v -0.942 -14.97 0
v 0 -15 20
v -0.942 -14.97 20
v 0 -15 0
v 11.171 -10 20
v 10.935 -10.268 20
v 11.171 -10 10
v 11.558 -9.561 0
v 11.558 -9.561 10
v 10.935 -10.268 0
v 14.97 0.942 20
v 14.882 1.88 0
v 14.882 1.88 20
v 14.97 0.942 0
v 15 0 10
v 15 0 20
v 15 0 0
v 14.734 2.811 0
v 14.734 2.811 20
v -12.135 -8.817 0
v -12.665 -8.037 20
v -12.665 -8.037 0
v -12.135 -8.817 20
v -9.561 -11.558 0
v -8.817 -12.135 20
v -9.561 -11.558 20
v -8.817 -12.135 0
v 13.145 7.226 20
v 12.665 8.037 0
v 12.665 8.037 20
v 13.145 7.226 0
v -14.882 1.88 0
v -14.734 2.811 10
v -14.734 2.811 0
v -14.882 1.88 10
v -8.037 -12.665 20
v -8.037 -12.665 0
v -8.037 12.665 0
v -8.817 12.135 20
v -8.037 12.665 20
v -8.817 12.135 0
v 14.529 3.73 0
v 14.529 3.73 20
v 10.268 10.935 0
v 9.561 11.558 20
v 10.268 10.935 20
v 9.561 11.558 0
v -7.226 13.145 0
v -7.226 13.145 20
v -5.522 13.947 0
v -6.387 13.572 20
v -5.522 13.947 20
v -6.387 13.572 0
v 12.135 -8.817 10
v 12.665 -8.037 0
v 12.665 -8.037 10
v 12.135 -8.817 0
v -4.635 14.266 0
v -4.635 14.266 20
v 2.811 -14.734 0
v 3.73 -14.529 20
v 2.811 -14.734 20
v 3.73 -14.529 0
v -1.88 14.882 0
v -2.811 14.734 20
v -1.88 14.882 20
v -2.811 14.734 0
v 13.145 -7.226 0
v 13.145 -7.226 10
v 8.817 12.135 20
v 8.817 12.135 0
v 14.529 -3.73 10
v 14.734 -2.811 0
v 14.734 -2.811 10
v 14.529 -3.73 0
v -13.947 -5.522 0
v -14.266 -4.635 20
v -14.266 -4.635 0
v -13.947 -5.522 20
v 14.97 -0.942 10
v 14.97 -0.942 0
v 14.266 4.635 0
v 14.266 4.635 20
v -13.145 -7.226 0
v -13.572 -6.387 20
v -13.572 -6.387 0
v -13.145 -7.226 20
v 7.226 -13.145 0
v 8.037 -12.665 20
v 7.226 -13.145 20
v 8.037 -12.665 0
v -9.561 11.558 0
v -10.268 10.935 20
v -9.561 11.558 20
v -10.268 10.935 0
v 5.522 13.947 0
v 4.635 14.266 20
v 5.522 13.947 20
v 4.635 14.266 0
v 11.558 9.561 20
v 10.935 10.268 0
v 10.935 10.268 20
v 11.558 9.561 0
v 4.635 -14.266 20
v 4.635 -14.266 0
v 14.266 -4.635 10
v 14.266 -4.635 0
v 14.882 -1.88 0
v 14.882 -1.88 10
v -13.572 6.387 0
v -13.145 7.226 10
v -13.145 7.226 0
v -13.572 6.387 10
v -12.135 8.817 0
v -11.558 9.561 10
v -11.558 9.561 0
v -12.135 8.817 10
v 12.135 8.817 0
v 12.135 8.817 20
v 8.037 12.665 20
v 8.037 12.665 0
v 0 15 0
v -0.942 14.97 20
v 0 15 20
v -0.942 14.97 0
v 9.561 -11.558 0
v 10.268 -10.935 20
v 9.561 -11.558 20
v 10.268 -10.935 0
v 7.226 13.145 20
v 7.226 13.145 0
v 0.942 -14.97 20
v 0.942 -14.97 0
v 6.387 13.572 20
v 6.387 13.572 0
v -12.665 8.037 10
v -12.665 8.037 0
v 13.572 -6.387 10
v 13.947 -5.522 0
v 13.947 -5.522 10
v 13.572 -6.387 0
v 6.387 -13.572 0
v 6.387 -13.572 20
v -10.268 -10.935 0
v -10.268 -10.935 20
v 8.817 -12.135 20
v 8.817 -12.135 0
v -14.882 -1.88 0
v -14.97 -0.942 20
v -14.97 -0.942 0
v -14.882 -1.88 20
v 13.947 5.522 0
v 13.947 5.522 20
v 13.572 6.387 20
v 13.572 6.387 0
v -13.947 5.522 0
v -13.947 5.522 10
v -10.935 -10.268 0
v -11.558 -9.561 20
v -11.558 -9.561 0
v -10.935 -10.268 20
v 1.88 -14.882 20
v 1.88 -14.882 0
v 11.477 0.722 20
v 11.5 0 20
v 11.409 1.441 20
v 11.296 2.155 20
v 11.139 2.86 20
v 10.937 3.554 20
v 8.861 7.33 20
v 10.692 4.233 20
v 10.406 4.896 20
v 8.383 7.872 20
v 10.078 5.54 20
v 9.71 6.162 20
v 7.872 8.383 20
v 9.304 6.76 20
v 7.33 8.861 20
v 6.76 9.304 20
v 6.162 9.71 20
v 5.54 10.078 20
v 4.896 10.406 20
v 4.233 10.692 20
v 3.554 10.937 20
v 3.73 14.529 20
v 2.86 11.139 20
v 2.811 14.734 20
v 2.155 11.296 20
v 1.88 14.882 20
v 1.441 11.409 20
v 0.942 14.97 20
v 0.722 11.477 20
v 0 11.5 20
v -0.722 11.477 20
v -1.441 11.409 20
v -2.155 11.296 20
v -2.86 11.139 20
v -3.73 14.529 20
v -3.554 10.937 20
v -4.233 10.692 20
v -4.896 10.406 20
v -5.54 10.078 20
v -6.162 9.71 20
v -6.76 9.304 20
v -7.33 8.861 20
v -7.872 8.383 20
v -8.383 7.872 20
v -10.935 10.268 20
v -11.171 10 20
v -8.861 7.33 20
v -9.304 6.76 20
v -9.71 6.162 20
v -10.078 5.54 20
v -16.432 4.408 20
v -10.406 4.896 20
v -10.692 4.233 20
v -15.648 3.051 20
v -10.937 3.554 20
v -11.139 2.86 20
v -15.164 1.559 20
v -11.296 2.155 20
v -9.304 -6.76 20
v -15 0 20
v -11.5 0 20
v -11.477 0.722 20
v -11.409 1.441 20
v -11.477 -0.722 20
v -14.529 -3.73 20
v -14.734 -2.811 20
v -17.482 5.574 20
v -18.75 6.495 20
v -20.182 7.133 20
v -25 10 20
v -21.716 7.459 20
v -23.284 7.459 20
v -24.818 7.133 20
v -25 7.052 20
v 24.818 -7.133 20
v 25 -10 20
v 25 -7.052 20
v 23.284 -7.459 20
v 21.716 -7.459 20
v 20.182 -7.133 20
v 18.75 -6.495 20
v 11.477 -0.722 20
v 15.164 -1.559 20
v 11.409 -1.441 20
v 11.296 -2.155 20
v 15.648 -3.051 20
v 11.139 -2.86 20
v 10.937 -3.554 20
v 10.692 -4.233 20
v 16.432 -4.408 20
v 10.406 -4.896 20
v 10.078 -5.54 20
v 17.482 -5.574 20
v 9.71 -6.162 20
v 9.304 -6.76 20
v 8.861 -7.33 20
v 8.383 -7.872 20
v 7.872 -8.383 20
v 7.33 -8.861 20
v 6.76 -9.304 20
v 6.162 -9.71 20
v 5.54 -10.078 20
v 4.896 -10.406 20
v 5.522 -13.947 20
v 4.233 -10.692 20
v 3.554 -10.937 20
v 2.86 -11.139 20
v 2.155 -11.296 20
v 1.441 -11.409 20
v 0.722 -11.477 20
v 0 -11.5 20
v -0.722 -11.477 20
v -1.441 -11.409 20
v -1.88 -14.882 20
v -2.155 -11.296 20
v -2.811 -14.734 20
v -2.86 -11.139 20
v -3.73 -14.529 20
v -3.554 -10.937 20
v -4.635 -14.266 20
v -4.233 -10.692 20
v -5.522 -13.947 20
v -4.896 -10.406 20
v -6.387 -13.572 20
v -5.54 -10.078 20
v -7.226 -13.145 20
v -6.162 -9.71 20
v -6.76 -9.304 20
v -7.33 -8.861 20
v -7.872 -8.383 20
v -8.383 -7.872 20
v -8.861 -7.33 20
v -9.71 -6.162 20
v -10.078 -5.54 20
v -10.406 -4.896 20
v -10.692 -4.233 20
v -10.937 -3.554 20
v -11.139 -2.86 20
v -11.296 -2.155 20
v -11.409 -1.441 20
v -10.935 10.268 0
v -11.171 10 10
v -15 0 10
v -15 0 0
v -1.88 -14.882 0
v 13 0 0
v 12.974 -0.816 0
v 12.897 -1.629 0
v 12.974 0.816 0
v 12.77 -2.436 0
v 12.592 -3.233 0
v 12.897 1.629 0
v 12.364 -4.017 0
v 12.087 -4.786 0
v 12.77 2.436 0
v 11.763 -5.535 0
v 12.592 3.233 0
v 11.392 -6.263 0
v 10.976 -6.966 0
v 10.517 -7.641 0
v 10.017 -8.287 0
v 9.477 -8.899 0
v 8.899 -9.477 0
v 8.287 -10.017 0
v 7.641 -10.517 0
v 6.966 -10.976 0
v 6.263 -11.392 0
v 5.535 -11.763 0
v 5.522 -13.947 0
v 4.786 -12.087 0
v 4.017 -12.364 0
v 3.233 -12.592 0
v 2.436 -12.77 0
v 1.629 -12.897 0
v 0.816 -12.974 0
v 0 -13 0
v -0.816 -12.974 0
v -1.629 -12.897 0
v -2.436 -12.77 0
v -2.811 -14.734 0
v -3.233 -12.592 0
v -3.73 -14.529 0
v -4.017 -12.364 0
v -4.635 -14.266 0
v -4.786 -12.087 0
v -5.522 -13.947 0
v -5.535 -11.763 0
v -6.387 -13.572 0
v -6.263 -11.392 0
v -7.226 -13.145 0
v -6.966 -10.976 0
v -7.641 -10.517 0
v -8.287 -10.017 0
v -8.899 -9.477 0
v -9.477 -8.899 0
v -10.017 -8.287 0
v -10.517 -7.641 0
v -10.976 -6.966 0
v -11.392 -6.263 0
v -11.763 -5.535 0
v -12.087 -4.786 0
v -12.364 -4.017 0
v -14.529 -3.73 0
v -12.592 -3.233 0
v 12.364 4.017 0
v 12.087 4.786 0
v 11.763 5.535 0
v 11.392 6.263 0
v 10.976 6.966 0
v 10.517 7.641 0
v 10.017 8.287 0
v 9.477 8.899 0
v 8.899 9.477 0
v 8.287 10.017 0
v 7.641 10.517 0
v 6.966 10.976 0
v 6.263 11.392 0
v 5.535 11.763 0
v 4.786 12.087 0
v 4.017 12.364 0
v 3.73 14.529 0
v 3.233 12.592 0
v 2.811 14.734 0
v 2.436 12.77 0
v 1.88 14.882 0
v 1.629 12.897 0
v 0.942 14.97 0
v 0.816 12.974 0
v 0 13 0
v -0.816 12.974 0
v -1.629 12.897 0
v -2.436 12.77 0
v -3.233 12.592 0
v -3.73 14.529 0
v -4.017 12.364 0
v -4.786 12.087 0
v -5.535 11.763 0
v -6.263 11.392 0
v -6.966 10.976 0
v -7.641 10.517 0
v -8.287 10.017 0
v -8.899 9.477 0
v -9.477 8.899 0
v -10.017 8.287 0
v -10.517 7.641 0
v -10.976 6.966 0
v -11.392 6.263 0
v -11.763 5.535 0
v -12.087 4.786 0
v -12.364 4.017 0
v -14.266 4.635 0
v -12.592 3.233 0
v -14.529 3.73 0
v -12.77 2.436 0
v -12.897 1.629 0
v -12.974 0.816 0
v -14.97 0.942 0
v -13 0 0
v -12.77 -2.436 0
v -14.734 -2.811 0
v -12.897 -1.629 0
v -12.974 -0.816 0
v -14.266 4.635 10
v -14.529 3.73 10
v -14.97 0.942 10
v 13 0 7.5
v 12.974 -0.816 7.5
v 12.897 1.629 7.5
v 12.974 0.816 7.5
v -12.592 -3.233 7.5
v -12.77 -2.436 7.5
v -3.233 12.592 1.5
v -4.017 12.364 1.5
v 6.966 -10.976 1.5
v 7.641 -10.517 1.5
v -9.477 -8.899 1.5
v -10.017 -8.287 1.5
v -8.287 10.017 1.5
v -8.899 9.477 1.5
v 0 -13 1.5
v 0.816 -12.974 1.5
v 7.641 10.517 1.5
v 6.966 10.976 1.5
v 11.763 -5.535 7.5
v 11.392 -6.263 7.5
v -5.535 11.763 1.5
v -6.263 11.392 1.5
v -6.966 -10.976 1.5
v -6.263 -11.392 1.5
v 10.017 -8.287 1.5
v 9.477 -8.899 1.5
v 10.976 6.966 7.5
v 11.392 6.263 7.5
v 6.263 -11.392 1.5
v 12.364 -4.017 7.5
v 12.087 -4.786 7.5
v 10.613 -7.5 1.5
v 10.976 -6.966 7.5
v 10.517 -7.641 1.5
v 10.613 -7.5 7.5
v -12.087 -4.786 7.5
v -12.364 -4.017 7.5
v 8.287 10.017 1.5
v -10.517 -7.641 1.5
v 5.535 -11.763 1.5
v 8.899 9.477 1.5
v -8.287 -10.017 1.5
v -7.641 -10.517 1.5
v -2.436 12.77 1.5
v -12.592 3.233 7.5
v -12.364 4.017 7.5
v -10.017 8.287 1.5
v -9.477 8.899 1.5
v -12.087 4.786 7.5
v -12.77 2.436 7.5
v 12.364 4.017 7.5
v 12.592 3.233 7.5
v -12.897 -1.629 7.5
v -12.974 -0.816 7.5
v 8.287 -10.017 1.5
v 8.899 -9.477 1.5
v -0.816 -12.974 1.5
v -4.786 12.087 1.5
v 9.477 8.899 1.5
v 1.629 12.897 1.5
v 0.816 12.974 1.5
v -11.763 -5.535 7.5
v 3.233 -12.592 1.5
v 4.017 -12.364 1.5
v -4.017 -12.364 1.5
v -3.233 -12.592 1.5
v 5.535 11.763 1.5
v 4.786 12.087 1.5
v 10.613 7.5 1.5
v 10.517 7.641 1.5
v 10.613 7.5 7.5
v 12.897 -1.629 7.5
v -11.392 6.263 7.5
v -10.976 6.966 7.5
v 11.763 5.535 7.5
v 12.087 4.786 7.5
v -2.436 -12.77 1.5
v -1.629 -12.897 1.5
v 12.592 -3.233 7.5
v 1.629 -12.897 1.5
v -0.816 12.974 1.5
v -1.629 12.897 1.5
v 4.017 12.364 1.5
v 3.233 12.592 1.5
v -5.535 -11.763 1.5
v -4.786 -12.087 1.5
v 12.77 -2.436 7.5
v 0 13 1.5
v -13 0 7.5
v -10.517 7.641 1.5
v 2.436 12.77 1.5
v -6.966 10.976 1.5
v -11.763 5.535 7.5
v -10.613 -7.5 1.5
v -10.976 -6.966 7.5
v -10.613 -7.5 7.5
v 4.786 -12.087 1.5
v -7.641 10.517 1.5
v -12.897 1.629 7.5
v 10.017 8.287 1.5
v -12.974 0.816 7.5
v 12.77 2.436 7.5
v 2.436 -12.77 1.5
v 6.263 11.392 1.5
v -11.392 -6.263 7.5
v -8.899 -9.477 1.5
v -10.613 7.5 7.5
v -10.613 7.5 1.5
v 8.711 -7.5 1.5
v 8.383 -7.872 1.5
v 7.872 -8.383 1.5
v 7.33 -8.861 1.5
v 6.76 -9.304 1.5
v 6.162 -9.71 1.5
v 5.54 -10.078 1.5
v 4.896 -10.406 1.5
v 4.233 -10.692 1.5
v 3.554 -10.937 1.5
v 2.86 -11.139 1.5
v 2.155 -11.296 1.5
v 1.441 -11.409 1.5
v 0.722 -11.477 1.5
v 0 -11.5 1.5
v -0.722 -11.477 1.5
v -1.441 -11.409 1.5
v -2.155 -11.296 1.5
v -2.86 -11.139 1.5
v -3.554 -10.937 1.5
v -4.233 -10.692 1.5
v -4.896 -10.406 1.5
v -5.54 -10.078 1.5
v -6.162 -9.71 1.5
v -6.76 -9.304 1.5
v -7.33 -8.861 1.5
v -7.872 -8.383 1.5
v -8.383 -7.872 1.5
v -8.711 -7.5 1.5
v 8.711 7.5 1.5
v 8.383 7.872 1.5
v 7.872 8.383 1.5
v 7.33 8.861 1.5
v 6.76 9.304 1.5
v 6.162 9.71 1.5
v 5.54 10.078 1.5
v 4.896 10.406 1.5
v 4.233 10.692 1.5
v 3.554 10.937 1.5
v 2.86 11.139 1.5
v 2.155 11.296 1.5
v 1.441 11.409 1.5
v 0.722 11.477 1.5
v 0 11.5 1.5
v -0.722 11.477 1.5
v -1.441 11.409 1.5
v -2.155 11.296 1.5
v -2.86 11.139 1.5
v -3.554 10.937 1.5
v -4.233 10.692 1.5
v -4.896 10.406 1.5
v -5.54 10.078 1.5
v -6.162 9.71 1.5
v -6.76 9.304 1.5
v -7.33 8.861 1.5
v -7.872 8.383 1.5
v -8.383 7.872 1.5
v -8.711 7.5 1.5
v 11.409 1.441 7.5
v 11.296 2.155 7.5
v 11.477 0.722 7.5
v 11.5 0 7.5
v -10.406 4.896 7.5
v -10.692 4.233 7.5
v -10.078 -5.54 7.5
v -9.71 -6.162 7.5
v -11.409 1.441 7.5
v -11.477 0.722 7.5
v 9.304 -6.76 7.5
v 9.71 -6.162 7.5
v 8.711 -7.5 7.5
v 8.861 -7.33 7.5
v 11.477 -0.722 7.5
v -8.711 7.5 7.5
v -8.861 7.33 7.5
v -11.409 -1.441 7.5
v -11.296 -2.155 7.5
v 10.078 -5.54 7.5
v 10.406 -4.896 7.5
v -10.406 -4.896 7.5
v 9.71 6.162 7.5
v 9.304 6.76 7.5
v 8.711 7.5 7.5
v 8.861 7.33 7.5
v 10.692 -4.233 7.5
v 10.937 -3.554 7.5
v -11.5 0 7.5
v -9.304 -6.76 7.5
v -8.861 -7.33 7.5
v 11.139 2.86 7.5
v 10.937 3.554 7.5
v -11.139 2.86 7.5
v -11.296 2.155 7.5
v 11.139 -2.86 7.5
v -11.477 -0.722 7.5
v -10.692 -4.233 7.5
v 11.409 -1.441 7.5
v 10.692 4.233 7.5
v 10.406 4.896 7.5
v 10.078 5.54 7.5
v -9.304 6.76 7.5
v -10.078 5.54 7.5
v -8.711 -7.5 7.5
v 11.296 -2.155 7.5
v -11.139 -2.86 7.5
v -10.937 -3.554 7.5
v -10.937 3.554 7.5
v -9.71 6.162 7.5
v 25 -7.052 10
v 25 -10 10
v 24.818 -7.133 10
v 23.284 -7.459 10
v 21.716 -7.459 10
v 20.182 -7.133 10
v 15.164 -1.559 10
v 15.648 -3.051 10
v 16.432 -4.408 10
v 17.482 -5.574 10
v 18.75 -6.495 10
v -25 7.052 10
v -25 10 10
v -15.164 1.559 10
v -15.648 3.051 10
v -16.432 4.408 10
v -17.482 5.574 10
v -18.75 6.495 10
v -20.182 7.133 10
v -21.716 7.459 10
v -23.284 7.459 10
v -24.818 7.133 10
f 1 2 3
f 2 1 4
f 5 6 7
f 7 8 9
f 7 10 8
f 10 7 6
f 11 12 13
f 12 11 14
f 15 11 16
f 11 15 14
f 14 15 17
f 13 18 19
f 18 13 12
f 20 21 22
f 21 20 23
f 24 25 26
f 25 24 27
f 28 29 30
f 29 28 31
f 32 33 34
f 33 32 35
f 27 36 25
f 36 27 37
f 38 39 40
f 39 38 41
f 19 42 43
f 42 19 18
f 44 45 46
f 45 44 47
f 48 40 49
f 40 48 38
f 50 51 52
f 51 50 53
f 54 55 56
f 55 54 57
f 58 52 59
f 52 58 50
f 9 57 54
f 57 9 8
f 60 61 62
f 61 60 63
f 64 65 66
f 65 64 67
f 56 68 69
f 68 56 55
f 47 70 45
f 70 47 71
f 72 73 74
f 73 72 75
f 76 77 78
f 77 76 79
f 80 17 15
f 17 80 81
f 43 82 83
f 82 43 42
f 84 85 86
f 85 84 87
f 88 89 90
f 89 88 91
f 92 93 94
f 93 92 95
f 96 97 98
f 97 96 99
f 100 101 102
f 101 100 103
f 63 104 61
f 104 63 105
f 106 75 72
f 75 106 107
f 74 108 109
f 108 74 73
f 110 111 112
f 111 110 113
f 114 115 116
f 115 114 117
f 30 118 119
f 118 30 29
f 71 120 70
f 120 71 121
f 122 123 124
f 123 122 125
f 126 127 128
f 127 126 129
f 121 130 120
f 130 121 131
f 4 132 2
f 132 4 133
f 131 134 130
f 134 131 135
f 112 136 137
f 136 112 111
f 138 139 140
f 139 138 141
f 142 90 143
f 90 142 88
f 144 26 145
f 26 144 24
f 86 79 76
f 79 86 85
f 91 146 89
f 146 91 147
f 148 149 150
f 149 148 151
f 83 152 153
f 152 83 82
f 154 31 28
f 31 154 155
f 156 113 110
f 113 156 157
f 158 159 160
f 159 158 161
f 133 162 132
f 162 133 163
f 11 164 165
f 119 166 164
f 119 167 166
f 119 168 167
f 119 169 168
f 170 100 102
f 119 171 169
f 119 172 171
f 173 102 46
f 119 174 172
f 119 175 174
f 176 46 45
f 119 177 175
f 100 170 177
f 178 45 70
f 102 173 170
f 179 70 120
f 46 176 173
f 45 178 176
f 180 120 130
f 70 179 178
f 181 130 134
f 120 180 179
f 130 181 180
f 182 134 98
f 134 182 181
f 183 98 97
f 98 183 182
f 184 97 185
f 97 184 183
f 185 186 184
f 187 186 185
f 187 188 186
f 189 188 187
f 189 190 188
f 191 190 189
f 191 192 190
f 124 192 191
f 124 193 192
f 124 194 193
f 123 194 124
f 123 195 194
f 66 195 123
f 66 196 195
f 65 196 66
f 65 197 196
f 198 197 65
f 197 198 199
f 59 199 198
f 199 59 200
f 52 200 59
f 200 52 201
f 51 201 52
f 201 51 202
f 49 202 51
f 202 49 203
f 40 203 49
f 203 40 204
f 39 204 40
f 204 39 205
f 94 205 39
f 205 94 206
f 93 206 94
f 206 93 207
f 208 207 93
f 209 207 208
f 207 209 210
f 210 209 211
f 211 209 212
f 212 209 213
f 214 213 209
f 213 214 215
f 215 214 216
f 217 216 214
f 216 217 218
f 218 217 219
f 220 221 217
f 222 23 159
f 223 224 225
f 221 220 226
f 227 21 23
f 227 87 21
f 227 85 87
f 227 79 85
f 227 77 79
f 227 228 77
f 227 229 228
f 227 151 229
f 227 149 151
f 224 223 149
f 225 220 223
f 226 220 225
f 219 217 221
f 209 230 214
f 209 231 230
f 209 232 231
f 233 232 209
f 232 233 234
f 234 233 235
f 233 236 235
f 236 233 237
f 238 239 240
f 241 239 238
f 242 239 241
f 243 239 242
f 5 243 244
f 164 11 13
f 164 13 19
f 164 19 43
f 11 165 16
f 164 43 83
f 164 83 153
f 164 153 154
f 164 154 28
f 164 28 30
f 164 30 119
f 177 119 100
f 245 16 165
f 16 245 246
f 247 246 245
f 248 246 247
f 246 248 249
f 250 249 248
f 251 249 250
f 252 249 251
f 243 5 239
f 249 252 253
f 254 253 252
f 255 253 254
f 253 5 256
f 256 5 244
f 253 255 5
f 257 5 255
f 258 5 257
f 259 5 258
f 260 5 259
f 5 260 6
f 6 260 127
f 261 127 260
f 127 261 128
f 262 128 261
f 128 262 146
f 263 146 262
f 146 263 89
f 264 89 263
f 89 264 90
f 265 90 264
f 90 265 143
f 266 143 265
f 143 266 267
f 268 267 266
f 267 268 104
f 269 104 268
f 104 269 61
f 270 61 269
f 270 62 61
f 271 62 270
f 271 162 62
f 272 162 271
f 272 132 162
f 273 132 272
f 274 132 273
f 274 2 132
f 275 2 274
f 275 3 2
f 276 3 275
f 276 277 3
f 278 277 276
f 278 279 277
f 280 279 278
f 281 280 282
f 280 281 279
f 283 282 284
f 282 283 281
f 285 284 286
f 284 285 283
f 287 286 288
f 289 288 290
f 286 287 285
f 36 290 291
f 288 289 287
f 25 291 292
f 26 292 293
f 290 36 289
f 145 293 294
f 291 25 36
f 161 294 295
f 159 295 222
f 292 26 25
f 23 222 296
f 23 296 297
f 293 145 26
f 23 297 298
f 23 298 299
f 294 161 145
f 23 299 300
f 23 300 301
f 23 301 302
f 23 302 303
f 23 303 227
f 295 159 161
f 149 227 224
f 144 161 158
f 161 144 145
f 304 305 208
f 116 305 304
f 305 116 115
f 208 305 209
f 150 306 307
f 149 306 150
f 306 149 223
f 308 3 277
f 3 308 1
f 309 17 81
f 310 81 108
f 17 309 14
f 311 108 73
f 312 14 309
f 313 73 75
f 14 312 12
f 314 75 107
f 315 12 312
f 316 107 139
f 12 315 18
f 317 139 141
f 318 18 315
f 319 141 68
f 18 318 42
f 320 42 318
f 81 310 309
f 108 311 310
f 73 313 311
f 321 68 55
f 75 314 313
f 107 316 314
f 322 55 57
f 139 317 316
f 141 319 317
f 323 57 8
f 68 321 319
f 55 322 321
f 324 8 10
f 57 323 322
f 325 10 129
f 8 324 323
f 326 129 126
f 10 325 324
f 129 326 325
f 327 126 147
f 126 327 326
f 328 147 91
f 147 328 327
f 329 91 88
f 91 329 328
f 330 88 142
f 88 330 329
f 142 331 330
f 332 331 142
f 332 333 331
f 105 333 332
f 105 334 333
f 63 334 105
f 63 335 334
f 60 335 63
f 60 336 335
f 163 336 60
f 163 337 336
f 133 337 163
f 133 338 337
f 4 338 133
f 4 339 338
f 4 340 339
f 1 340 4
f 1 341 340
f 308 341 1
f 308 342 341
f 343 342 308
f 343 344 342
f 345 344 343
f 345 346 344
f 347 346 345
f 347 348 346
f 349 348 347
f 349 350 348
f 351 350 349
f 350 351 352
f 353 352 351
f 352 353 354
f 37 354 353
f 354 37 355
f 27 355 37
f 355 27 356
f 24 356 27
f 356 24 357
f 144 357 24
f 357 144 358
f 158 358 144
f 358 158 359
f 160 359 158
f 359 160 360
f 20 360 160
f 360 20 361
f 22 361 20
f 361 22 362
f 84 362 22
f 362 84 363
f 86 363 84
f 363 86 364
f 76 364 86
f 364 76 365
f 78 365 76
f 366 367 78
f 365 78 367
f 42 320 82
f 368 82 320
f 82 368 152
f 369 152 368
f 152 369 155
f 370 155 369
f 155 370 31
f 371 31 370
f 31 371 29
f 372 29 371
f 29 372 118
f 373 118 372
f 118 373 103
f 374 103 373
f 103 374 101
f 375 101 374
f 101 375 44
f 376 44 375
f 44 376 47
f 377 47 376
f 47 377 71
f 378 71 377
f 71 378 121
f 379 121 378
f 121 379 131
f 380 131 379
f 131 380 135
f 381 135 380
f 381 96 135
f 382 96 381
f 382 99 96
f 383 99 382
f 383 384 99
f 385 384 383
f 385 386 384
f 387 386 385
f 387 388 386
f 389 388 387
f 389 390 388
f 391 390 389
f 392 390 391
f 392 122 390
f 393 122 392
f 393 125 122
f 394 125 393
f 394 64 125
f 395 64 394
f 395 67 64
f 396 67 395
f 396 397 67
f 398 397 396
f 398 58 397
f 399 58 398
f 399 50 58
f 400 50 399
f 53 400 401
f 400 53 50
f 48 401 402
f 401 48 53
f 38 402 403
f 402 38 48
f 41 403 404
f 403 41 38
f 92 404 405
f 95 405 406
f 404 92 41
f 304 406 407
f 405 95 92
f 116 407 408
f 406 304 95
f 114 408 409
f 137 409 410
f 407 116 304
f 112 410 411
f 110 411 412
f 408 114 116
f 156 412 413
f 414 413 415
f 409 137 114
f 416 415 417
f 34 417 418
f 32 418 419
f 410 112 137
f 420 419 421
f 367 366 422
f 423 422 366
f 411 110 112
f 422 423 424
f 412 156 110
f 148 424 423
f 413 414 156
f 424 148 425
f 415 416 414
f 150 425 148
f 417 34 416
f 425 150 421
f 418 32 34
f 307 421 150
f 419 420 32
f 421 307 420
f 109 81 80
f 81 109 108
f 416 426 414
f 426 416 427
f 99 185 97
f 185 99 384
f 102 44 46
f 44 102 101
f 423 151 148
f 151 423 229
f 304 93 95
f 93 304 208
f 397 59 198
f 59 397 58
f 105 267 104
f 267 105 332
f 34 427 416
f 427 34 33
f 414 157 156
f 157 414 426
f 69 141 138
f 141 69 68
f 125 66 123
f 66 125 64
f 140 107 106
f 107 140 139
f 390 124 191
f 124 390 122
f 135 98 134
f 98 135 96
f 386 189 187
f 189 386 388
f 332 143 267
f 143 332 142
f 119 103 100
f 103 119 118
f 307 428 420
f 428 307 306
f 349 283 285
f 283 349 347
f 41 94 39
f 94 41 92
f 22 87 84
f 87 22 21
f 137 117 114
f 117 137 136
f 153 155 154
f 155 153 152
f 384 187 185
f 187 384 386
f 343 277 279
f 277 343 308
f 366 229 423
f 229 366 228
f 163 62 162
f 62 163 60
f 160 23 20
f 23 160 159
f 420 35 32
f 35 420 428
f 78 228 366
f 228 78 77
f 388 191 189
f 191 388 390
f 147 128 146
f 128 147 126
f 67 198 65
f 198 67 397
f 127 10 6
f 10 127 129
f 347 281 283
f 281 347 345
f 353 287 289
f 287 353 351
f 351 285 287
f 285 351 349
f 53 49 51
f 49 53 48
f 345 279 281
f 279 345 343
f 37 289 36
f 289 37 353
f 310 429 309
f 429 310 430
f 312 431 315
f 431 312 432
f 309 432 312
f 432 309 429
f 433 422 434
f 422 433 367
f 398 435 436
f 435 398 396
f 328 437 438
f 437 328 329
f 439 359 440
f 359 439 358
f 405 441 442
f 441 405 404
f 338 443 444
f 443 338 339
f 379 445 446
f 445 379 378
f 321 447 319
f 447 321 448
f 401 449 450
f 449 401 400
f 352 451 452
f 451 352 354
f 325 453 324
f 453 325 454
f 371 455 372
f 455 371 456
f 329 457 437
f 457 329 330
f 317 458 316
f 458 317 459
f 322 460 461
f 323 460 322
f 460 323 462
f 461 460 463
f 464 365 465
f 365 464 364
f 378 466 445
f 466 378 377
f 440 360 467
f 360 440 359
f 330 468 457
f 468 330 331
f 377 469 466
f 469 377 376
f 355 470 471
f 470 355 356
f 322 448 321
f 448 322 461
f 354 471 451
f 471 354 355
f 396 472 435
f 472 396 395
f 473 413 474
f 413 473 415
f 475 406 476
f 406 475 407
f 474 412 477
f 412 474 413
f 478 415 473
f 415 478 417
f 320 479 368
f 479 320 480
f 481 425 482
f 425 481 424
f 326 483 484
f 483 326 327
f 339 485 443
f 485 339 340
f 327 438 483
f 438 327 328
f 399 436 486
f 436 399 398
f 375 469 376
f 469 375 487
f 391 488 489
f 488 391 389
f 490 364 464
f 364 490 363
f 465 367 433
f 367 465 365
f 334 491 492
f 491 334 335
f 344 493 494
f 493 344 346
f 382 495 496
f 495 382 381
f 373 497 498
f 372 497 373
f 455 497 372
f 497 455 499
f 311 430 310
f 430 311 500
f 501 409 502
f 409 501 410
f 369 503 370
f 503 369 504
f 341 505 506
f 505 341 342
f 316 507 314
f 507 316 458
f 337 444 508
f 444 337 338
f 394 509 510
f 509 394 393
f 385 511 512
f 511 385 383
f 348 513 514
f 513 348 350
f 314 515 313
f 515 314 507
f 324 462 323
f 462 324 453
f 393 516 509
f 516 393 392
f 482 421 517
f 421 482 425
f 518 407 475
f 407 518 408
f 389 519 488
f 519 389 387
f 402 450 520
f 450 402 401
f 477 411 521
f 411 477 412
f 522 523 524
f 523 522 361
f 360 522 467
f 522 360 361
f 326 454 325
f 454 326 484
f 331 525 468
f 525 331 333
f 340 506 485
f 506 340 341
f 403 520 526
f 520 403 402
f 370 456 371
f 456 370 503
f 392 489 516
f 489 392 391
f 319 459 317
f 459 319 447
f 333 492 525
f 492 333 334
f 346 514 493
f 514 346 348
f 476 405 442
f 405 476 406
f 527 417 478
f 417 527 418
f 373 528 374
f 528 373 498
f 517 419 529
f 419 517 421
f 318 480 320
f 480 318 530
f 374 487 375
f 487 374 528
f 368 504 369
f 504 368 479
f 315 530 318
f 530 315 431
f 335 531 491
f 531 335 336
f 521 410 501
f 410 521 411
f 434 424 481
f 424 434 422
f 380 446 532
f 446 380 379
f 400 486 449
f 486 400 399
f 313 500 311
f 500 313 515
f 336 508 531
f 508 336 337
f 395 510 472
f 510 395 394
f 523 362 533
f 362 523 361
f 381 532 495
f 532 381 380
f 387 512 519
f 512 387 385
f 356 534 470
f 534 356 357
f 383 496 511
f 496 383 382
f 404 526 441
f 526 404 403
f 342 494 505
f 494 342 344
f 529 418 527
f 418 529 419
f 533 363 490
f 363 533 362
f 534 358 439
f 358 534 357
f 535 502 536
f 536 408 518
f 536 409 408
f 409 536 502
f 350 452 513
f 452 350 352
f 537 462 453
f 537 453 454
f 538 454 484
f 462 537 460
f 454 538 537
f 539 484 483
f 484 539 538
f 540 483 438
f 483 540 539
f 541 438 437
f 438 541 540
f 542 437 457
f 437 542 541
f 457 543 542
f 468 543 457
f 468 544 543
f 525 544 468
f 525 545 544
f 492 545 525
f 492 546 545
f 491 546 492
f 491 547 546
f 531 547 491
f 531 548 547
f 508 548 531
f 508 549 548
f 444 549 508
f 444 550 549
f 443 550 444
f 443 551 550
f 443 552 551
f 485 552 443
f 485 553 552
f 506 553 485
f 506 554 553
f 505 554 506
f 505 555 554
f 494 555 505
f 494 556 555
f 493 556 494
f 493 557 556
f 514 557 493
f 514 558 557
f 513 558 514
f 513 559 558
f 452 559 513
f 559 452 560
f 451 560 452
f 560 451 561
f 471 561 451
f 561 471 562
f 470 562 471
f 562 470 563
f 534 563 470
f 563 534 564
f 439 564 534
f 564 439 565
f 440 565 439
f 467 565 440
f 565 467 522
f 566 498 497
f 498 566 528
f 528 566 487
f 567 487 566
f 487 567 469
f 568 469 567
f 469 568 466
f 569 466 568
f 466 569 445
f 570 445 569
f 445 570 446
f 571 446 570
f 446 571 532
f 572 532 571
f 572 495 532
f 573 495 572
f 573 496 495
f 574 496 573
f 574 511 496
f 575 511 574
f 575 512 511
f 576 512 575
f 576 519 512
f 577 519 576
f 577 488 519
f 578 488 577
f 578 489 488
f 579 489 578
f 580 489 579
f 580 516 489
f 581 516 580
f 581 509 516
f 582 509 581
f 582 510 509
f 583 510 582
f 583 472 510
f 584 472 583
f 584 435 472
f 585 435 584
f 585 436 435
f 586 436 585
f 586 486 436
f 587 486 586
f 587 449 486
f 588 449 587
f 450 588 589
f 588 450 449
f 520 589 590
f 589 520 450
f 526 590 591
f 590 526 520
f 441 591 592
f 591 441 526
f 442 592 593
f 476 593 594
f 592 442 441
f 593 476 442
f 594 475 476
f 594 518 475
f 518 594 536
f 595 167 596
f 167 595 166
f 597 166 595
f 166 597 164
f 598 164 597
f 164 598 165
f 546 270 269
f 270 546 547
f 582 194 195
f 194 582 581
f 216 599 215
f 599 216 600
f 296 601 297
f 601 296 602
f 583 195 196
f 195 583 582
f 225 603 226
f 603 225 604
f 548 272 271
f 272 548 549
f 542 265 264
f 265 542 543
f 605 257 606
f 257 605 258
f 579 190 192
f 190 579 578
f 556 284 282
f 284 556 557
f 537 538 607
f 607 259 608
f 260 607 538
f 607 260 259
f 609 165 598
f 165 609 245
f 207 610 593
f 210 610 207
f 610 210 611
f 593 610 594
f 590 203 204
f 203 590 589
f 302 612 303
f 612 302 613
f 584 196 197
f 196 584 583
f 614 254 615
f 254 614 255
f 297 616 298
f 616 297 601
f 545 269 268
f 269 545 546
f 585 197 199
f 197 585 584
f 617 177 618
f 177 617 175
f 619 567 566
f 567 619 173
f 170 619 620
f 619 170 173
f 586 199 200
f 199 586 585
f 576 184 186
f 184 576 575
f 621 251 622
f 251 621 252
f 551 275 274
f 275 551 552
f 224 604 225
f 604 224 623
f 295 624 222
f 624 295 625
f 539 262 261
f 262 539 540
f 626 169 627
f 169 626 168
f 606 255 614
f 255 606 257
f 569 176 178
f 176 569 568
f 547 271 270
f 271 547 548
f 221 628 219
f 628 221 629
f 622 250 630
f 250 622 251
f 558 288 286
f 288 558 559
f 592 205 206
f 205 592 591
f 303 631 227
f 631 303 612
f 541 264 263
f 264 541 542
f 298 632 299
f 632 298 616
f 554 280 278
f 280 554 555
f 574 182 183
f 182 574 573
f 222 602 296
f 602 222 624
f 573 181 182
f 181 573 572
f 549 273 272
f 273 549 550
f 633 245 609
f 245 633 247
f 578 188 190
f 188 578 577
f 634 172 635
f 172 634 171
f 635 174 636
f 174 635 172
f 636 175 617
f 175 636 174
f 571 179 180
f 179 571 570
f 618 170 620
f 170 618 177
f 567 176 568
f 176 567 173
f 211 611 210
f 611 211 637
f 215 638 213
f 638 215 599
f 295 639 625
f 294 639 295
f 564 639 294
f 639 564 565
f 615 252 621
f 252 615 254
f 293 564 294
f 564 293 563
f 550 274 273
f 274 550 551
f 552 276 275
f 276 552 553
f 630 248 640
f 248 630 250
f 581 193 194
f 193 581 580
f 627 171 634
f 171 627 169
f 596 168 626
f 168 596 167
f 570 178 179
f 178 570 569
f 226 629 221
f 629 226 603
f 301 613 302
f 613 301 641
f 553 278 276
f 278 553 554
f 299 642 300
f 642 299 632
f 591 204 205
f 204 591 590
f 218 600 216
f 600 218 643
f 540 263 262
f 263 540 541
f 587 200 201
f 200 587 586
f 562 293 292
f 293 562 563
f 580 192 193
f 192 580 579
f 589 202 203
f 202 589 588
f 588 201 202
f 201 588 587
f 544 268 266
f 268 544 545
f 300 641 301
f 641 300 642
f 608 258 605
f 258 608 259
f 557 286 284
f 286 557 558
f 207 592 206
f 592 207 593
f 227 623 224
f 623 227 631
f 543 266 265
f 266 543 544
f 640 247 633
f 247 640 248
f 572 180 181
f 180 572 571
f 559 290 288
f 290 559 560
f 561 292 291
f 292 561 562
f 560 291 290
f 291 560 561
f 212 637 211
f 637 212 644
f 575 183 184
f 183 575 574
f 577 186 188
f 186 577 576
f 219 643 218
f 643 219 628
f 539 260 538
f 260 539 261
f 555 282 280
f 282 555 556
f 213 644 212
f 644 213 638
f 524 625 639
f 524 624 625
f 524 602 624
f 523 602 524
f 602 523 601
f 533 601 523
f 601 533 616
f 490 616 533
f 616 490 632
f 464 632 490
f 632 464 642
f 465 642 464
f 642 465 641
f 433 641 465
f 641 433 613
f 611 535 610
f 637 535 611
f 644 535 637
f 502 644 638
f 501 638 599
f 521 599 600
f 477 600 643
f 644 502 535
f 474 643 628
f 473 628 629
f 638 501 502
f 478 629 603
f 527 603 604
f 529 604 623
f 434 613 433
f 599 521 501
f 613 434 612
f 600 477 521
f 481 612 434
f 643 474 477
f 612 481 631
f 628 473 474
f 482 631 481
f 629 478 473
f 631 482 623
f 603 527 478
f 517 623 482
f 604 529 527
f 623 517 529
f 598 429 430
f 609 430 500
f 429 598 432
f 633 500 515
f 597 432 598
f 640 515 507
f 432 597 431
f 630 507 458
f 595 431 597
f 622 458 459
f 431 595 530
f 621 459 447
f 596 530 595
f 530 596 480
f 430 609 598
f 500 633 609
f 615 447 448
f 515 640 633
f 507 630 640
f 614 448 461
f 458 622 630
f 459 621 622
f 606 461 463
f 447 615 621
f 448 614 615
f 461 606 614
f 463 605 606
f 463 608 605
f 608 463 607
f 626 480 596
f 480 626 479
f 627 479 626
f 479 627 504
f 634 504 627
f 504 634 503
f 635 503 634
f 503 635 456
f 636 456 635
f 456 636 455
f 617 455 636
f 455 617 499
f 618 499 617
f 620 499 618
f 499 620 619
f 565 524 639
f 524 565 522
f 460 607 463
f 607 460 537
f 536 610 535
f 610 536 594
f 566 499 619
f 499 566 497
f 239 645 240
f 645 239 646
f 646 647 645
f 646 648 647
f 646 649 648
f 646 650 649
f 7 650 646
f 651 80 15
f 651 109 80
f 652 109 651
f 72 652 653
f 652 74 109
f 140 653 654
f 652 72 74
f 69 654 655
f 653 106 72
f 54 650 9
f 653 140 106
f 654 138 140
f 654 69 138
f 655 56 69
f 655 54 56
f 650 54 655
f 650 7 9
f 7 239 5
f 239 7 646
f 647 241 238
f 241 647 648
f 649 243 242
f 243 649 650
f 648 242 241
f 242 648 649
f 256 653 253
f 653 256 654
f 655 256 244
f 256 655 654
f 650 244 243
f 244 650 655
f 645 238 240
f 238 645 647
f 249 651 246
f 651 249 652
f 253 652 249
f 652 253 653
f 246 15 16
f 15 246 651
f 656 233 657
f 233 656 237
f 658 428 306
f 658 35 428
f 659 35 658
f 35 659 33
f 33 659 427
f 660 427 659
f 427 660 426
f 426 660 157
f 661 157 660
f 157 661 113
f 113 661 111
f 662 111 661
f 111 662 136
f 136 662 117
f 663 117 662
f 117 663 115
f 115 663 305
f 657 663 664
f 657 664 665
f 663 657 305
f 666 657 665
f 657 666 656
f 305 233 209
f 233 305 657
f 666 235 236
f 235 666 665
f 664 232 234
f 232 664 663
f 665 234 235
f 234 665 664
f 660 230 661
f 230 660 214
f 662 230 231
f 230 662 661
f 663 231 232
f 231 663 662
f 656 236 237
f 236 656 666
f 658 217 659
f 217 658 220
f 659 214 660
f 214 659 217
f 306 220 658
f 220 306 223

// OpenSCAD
id = 23;
od = 26;
wall = 2;
tab_wid = 15;
tab_hei = 6;

bottom_h = 1.5;

hei = 20;

module unscrew_30mm_button() 
{
	// outer strong pipe
 if (1)
 difference() {
 	cylinder(d=od+wall*2, h=hei, $fn=100);
	translate([0,0,-0.1])
 		cylinder(d=od, h=hei+1, $fn=100);
 }

	// 
 difference() {
	translate([0,0,bottom_h])
		cylinder(d=od, h=hei-bottom_h, $fn=100);

		// remove an overhang
	//translate([0,0,bottom_h-0.001])
 		//cylinder(d1=od, d2=1, h=od/2, $fn=100);
	translate([0,0,-0.1])
 		cylinder(d=id, h=hei*2, $fn=100);
	
	hull() {
		intersection() {
			//cylinder(d=od,h=tab_hei+bottom_h,$fn=100);
			translate([-50,-tab_wid/2,0])
				cube([100,tab_wid,tab_hei+bottom_h]);
		}
			// remove an overhang
		//cylinder(d=1,h=tab_hei+bottom_h+od/4);
	}
 }

 for (a=[0,180]) rotate(a=a,v=[0,0,1]) {
	difference() {
		union() {
 			translate([od/2,-10,hei-10])
				cube([12,10,10]);
 			translate([od/2-3,-10,hei-10])
				cube([4,4,10]);
		}
 		translate([od/2+wall+15/2,0,hei-10.1])
 			cylinder(d=15,h=10.2,$fn=30);
	}
 }
}
unscrew_30mm_button();
